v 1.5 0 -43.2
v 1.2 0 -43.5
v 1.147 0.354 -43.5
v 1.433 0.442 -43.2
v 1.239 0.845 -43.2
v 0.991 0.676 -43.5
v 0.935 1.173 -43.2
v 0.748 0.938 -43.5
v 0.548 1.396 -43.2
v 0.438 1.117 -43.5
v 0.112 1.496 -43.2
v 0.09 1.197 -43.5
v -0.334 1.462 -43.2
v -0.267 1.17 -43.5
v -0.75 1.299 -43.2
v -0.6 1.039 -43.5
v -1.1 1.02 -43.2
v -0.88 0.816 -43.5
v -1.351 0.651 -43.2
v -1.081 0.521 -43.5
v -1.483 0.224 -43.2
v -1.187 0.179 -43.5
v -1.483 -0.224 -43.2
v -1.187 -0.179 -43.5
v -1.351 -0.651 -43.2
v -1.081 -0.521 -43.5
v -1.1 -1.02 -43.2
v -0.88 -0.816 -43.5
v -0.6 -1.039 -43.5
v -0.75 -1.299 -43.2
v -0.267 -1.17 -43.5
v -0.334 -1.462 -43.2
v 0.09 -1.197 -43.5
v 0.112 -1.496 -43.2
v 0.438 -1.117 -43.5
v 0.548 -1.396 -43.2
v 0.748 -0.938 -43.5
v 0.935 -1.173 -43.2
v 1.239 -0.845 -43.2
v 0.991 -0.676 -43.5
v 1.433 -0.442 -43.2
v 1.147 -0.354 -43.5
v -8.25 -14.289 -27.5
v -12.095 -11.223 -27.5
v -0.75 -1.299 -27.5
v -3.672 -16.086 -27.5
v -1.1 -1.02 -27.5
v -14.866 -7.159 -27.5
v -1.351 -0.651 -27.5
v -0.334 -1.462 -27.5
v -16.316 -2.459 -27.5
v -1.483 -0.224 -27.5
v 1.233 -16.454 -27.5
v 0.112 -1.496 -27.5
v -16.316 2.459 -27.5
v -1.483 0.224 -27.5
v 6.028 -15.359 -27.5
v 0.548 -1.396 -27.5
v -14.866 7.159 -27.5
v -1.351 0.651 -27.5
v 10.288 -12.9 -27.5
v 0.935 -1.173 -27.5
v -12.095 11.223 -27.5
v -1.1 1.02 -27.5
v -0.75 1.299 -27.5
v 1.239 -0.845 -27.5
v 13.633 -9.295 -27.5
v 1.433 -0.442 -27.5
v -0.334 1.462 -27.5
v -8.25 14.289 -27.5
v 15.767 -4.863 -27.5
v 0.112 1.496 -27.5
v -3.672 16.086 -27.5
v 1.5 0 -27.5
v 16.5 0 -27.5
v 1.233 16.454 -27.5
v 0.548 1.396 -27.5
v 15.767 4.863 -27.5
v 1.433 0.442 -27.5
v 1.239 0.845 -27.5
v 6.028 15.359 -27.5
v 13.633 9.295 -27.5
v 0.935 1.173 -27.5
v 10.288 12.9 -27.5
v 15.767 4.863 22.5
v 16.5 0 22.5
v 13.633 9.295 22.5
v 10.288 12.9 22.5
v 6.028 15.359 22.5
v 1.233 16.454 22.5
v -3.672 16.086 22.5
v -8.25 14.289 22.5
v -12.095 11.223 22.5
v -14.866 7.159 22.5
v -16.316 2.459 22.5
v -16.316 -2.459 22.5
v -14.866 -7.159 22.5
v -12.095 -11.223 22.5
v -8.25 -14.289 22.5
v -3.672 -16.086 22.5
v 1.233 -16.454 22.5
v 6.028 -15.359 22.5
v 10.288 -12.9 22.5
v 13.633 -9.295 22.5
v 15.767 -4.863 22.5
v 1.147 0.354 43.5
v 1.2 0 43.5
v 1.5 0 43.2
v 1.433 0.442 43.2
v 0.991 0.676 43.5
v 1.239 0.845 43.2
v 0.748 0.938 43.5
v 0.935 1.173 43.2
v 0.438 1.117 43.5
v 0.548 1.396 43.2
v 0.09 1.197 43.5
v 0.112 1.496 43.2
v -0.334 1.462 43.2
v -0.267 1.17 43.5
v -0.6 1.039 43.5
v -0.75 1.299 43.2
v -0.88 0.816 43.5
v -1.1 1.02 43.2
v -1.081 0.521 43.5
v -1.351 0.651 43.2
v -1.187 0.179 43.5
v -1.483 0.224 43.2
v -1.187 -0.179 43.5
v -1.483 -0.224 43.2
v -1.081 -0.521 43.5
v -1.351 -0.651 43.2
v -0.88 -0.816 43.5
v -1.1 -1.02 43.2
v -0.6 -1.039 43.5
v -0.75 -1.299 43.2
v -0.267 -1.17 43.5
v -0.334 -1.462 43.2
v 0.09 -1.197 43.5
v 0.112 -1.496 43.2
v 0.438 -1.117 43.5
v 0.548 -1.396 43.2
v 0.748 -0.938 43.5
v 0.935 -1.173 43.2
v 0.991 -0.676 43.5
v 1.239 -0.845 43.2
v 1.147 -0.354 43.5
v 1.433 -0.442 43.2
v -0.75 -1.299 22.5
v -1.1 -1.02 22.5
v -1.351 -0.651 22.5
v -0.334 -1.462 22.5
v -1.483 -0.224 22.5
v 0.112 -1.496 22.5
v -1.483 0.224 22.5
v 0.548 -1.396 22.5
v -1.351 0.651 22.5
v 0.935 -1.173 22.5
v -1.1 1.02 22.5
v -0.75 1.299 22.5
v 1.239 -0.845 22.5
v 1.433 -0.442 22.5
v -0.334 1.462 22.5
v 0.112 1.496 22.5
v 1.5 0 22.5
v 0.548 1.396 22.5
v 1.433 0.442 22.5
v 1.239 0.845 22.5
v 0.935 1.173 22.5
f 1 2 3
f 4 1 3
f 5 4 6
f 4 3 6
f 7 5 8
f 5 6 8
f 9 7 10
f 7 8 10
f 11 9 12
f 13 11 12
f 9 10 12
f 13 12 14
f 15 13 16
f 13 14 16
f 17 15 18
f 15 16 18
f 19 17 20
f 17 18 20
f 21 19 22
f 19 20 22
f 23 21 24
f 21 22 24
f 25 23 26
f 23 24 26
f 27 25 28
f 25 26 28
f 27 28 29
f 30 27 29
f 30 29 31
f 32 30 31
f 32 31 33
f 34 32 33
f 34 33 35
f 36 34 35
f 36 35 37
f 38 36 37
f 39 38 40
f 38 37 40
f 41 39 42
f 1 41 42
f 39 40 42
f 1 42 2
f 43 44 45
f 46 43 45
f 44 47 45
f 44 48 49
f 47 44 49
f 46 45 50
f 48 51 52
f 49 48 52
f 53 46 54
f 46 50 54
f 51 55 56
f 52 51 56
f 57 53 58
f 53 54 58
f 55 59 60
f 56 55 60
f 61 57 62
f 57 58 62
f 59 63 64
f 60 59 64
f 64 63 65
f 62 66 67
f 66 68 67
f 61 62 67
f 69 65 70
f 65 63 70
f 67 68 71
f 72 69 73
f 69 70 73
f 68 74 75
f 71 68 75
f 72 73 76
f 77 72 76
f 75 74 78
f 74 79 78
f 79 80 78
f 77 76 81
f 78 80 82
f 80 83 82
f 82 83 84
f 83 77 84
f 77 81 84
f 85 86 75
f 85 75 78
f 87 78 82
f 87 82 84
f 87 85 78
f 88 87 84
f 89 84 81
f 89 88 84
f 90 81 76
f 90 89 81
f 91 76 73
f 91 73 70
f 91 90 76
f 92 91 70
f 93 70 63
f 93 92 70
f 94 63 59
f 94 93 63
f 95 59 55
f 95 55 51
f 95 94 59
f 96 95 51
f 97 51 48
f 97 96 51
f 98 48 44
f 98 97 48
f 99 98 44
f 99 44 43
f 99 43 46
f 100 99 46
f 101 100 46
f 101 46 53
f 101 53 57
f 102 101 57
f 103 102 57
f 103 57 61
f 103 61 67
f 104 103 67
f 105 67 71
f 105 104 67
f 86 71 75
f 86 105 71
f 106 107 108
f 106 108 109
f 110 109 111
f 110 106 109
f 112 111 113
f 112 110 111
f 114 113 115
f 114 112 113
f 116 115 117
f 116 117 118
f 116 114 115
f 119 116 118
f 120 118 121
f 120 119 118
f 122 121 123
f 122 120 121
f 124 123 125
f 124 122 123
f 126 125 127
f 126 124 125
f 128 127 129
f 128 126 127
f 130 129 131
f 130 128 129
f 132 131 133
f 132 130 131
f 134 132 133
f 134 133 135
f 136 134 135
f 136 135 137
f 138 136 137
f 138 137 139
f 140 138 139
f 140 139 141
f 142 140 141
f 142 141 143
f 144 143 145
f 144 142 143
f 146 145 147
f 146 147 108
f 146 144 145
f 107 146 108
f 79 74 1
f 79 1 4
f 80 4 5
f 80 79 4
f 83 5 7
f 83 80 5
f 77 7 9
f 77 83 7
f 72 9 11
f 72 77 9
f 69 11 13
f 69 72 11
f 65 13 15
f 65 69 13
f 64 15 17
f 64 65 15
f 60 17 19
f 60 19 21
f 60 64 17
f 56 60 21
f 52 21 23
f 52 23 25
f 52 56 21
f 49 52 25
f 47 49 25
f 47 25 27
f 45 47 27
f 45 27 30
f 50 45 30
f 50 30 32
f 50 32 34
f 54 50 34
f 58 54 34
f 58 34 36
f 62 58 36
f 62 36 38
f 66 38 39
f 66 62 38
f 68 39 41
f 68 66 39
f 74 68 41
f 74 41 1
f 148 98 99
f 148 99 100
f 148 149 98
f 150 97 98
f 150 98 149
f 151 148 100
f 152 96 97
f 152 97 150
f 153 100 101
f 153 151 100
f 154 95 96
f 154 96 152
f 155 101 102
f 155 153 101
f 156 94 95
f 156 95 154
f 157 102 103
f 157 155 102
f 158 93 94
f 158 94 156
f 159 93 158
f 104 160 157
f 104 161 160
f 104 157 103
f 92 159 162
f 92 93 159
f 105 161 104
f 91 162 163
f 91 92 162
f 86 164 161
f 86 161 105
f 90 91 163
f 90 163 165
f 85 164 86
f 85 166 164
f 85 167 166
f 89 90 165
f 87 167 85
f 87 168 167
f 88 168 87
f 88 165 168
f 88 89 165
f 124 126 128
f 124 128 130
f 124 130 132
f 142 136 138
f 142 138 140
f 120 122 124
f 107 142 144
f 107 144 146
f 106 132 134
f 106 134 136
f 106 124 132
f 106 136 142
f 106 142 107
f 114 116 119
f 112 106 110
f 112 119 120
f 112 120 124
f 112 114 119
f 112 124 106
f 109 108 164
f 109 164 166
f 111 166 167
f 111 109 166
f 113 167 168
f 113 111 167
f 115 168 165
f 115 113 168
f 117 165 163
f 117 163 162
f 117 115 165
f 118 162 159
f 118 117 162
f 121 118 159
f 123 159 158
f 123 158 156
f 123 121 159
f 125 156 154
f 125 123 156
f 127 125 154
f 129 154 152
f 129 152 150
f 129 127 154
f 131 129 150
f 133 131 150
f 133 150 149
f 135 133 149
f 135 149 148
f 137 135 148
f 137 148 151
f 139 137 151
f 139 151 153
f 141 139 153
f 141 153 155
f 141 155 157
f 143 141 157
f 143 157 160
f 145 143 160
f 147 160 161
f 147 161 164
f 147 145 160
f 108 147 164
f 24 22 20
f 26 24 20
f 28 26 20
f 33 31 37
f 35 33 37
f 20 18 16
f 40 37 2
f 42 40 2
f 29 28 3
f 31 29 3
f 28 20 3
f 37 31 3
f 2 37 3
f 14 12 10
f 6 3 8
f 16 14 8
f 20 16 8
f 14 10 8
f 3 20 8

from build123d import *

# Parameters (mm, degrees)
SKETCH1_R           = 1.5
BOSS_EXTRUDE1_DEPTH = 43.5
SKETCH4_R           = 16.5
SKETCH4_R_2         = 1.5
BOSS_EXTRUDE2_DEPTH = 50
CHAMFER1_SIZE       = 0.3


with BuildPart() as part:
    # Sketch1 → Boss-Extrude1 (new, symmetric)
    with BuildSketch(Plane.XY):
        Circle(SKETCH1_R)
    extrude(amount=BOSS_EXTRUDE1_DEPTH, both=True)

    # Sketch4 → Boss-Extrude2 (add)
    with BuildSketch(Plane.XY.offset(22.5)):
        Circle(SKETCH4_R)
        Circle(SKETCH4_R_2, mode=Mode.SUBTRACT)
    extrude(amount=-BOSS_EXTRUDE2_DEPTH)

    # Chamfer1
    chamfer1_edges = [part.edges().sort_by_distance(p)[0] for p in [
        (-1.5, 0, -43.5),
        (-1.5, 0, 43.5),
    ]]
    chamfer(chamfer1_edges, length=CHAMFER1_SIZE)


solid = part.part
